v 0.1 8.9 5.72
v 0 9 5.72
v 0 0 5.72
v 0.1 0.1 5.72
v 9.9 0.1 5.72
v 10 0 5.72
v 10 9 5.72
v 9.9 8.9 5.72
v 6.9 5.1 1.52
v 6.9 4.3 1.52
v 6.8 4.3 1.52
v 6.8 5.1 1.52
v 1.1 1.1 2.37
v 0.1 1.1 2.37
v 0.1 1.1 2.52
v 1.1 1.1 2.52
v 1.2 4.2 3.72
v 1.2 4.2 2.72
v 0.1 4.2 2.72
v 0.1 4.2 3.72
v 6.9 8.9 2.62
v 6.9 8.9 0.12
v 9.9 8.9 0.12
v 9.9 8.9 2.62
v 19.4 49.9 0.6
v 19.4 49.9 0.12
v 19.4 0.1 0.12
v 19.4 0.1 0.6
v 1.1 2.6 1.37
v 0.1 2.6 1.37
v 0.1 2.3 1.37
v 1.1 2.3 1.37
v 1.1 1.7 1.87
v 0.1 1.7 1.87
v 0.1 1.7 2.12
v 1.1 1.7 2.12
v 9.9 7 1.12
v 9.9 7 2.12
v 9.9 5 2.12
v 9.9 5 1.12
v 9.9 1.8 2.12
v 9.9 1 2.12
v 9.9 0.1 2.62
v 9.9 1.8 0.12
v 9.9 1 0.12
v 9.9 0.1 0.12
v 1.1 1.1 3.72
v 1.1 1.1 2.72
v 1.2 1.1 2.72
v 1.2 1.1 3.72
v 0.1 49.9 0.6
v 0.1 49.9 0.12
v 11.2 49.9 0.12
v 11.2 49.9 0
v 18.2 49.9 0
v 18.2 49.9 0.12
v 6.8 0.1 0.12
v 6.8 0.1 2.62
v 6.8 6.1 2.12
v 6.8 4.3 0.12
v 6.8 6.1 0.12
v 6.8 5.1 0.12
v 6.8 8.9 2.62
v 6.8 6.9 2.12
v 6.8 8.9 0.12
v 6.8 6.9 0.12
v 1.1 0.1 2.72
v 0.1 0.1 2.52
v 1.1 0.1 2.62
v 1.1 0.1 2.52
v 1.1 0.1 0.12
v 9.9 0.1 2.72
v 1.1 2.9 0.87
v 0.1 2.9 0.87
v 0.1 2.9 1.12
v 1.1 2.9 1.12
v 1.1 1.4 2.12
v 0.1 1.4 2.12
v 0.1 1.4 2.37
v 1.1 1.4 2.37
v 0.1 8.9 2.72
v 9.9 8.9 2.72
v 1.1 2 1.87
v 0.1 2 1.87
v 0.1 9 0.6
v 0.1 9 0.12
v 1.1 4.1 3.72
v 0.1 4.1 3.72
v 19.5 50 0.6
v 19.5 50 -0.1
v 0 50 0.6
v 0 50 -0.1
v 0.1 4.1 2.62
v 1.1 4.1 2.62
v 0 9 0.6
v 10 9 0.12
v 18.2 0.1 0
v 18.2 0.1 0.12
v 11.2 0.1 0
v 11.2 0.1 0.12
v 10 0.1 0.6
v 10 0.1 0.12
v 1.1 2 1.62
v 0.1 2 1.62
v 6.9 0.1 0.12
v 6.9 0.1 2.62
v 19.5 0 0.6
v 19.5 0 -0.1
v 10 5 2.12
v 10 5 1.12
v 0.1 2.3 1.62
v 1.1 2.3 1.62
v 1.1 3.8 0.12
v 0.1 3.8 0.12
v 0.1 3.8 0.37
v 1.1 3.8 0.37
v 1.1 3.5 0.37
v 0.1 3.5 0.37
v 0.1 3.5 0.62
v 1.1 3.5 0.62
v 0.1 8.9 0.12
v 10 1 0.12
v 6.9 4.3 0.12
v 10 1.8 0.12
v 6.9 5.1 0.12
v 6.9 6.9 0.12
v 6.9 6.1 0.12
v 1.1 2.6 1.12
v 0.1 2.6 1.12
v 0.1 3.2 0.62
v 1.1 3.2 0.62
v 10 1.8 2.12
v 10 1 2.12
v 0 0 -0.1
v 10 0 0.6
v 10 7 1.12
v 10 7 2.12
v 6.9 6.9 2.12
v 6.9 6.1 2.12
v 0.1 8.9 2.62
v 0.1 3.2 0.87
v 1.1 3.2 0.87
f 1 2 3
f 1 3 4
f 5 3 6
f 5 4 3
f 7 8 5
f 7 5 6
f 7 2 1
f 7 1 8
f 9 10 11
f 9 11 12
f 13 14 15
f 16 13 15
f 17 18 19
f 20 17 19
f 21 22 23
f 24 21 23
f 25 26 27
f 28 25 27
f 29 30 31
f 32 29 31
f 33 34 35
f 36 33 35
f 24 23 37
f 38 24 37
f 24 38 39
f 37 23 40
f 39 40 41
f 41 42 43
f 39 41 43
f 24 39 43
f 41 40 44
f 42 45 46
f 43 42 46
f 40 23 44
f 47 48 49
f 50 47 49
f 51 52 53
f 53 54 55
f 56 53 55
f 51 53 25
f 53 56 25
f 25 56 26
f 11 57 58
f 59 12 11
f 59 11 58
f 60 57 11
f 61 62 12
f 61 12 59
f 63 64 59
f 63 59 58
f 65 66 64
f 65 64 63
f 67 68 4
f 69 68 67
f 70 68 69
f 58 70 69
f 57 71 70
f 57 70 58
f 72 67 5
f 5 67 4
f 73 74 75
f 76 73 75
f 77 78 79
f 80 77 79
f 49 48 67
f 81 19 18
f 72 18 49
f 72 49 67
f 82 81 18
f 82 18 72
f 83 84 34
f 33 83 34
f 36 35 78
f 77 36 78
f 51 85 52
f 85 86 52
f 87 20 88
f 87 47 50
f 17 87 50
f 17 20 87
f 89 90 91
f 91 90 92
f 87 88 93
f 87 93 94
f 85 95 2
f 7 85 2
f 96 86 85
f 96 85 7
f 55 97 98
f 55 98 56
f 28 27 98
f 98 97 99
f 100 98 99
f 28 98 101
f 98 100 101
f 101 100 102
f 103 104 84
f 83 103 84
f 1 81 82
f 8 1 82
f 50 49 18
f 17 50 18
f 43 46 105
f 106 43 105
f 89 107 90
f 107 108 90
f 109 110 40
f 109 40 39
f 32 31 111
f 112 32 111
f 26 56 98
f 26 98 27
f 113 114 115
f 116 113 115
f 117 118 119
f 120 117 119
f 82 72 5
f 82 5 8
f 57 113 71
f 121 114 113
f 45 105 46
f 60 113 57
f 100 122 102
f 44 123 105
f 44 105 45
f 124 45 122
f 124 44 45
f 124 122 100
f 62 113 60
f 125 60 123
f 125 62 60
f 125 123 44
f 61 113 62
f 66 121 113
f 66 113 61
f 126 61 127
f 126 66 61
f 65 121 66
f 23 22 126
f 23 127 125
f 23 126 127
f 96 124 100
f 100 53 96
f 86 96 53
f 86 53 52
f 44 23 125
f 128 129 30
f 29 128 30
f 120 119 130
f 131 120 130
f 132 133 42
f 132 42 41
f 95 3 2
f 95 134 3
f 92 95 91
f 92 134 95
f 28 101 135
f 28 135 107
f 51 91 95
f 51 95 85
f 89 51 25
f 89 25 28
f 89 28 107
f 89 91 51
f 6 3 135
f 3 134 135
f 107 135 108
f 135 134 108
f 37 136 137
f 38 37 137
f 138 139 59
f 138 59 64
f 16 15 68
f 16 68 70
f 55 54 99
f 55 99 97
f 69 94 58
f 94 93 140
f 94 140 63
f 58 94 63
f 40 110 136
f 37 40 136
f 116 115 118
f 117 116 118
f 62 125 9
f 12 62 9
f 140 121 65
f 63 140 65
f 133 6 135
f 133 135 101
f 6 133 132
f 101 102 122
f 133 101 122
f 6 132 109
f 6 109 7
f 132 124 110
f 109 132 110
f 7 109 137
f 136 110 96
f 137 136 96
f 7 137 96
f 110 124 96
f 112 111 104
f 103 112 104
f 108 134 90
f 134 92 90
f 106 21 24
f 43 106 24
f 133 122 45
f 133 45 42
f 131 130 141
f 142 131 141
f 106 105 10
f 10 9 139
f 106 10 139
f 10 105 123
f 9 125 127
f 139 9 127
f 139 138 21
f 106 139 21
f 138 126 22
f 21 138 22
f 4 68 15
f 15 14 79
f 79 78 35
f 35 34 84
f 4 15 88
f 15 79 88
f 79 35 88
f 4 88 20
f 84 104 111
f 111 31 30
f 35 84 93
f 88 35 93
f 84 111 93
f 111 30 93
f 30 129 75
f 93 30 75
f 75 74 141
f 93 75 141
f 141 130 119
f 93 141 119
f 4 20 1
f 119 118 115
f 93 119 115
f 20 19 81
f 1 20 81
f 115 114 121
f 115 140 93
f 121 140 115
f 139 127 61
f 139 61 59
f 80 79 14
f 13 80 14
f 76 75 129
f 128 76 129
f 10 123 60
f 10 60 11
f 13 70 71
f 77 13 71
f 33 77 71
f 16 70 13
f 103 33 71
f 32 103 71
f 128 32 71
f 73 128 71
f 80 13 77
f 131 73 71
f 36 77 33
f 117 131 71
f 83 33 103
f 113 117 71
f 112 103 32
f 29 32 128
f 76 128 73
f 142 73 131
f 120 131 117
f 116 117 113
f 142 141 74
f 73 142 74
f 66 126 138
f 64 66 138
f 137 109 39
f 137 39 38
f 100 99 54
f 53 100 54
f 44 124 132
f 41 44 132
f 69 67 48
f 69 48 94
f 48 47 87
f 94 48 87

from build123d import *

# Parameters (mm, degrees)
F0_W      = 1.2
F0_H      = 49.8
F0_W_2    = 10
F1_DEPTH  = 0.12
F0_W_3    = 7
F0_H_2    = 0.1
F0_W_4    = 0.1
F1_FACE_W = 11.2
F1_FACE_H = 49.8
F2_DEPTH  = 0.1
F3_DEPTH  = 0.6
F4_W      = 10
F4_H      = 9
F4_W_2    = 0.1
F4_H_2    = 8.8
F5_DEPTH  = 2.5
F6_W      = 0.8
F6_H      = 2
F6_W_2    = 2
F6_H_2    = 1
F7_DEPTH  = 0.1
F8_W      = 0.8
F8_H      = 1.4
F8_H_2    = 2
F9_DEPTH  = 0.1
F11_DEPTH = 1
F12_W     = 10
F12_H     = 9
F12_W_2   = 3
F12_H_2   = 8.8
F13_DEPTH = 0.1
F14_W     = 10
F14_H     = 9
F14_W_2   = 9.8
F14_H_2   = 8.8
F15_DEPTH = 3
F16_W     = 1
F16_H     = 4
F17_DEPTH = 0.2
F18_W     = 0.1
F18_H     = 50
F19_DEPTH = 0.6
F21_DEPTH = 1


with BuildPart() as f1:
    # F0 (on Top) → F1 (new body)
    with BuildSketch(Plane.XY):
        with Locations((10.6, 25)):
            Rectangle(F0_W, F0_H)
        with Locations((5, 25)):
            Rectangle(F0_W_2, F0_H)
    extrude(amount=F1_DEPTH)



with BuildPart() as f1b:
    # F0 (on Top) → F1, piece 2 (new body)
    with BuildSketch(Plane.XY):
        with Locations((18.8, 25)):
            Rectangle(F0_W, F0_H)
    extrude(amount=F1_DEPTH)


with BuildPart() as f1_1:
    add(f1.part)

    add(f1b.part)  # F2 merges F1b
    # F0 (on Top) + F1_face (on face) → F2 (join)
    with BuildSketch(Plane.XY):
        with Locations((5, 25)):
            Rectangle(F0_W_2, F0_H)
        with Locations((10.6, 25)):
            Rectangle(F0_W, F0_H)
        with Locations((18.8, 25)):
            Rectangle(F0_W, F0_H)
        with Locations((14.7, 25)):
            Rectangle(F0_W_3, F0_H)
        with Locations((14.7, 0.05)):
            Rectangle(F0_W_3, F0_H_2)
        with Locations((10.6, 0.05)):
            Rectangle(F0_W, F0_H_2)
        with Locations((18.8, 0.05)):
            Rectangle(F0_W, F0_H_2)
        with Locations((19.45, 25)):
            Rectangle(F0_W_4, F0_H)
        with Locations((19.45, 0.05)):
            Rectangle(F0_W_4, F0_H_2)
        with Locations((5, 0.05)):
            Rectangle(F0_W_2, F0_H_2)
        with Locations((19.45, 49.95)):
            Rectangle(F0_W_4, F0_H_2)
        with Locations((18.8, 49.95)):
            Rectangle(F0_W, F0_H_2)
        with Locations((14.7, 49.95)):
            Rectangle(F0_W_3, F0_H_2)
        with Locations((10.6, 49.95)):
            Rectangle(F0_W, F0_H_2)
        with Locations((5, 49.95)):
            Rectangle(F0_W_2, F0_H_2)
    with BuildSketch(Plane(origin=(5.6, 25, 0.12), x_dir=(1, 0, 0), z_dir=(0, 0, 1))):
        Rectangle(F1_FACE_W, F1_FACE_H)
    extrude(amount=-F2_DEPTH)

    # F0 (on Top) → F3 (join)
    with BuildSketch(Plane.XY):
        with Locations((10.6, 49.95)):
            Rectangle(F0_W, F0_H_2)
        with Locations((5, 49.95)):
            Rectangle(F0_W_2, F0_H_2)
        with Locations((14.7, 49.95)):
            Rectangle(F0_W_3, F0_H_2)
        with Locations((18.8, 49.95)):
            Rectangle(F0_W, F0_H_2)
        with Locations((19.45, 25)):
            Rectangle(F0_W_4, F0_H)
        with Locations((19.45, 49.95)):
            Rectangle(F0_W_4, F0_H_2)
        with Locations((19.45, 0.05)):
            Rectangle(F0_W_4, F0_H_2)
        with Locations((18.8, 0.05)):
            Rectangle(F0_W, F0_H_2)
        with Locations((14.7, 0.05)):
            Rectangle(F0_W_3, F0_H_2)
        with Locations((5, 0.05)):
            Rectangle(F0_W_2, F0_H_2)
        with Locations((10.6, 0.05)):
            Rectangle(F0_W, F0_H_2)
    extrude(amount=F3_DEPTH)

    # F4 (on face) → F5 (join)
    with BuildSketch(Plane.XY.offset(0.12)):
        with Locations((5, 4.5)):
            Rectangle(F4_W, F4_H)
        Polygon((6.8, 0.1), (0.1, 0.1), (0.1, 8.9), (6.8, 8.9), (6.9, 8.9), (9.9, 8.9), (9.9, 0.1), (6.9, 0.1), align=None, mode=Mode.SUBTRACT)
        with Locations((6.85, 4.5)):
            Rectangle(F4_W_2, F4_H_2)
    extrude(amount=F5_DEPTH)

    # F6 (on face) → F7 (cut, through all)
    with BuildSketch(Plane.YZ.offset(10)):
        with Locations((1.4, 1.12)):
            Rectangle(F6_W, F6_H)
        with Locations((6, 1.62)):
            Rectangle(F6_W_2, F6_H_2)
    extrude(amount=-F7_DEPTH, mode=Mode.SUBTRACT)

    # F8 (on face) → F9 (cut, through all)
    with BuildSketch(Plane.YZ.offset(6.9)):
        with Locations((4.7, 0.82)):
            Rectangle(F8_W, F8_H)
        with Locations((6.5, 1.12)):
            Rectangle(F8_W, F8_H_2)
    extrude(amount=-F9_DEPTH, mode=Mode.SUBTRACT)

    # F10 (on face) → F11 (join)
    with BuildSketch(Plane.YZ.offset(0.1)):
        Polygon((0.1, 0.12), (3.8, 0.12), (3.8, 0.37), (3.5, 0.37), (3.5, 0.62), (3.2, 0.62), (3.2, 0.87), (2.9, 0.87), (2.9, 1.12), (2.6, 1.12), (2.6, 1.37), (2.3, 1.37), (2.3, 1.62), (2, 1.62), (2, 1.87), (1.7, 1.87), (1.7, 2.12), (1.4, 2.12), (1.4, 2.37), (1.1, 2.37), (1.1, 2.62), (0.1, 2.62), align=None)
    extrude(amount=F11_DEPTH)

    # F12 (on face) → F13 (join)
    with BuildSketch(Plane.XY.offset(2.62)):
        with Locations((5, 4.5)):
            Rectangle(F12_W, F12_H)
        Polygon((6.8, 8.9), (6.8, 0.1), (1.1, 0.1), (1.1, 1.1), (0.1, 1.1), (0.1, 8.9), align=None, mode=Mode.SUBTRACT)
        with Locations((8.4, 4.5)):
            Rectangle(F12_W_2, F12_H_2, mode=Mode.SUBTRACT)
        Polygon((1.1, 0.1), (6.8, 0.1), (6.8, 8.9), (0.1, 8.9), (0.1, 1.1), (1.1, 1.1), align=None)
        with Locations((8.4, 4.5)):
            Rectangle(F12_W_2, F12_H_2)
    extrude(amount=F13_DEPTH)

    # F14 (on face) → F15 (join)
    with BuildSketch(Plane.XY.offset(2.72)):
        with Locations((5, 4.5)):
            Rectangle(F14_W, F14_H)
        with Locations((5, 4.5)):
            Rectangle(F14_W_2, F14_H_2, mode=Mode.SUBTRACT)
    extrude(amount=F15_DEPTH)

    # F16 (on face) → F17 (cut)
    with BuildSketch(Plane.XY.offset(2.72)):
        with Locations((0.6, 2.1)):
            Rectangle(F16_W, F16_H)
    extrude(amount=-F17_DEPTH, mode=Mode.SUBTRACT)

    # F18 (on face) → F19 (join)
    with BuildSketch(Plane.XY):
        with Locations((0.05, 25)):
            Rectangle(F18_W, F18_H)
    extrude(amount=F19_DEPTH)

    # F20 (on face) → F21 (join)
    with BuildSketch(Plane.XY.offset(2.72)):
        Polygon((1.2, 4.2), (0.1, 4.2), (0.1, 4.1), (1.1, 4.1), (1.1, 1.1), (1.2, 1.1), align=None)
    extrude(amount=F21_DEPTH)


solid = f1_1.part
